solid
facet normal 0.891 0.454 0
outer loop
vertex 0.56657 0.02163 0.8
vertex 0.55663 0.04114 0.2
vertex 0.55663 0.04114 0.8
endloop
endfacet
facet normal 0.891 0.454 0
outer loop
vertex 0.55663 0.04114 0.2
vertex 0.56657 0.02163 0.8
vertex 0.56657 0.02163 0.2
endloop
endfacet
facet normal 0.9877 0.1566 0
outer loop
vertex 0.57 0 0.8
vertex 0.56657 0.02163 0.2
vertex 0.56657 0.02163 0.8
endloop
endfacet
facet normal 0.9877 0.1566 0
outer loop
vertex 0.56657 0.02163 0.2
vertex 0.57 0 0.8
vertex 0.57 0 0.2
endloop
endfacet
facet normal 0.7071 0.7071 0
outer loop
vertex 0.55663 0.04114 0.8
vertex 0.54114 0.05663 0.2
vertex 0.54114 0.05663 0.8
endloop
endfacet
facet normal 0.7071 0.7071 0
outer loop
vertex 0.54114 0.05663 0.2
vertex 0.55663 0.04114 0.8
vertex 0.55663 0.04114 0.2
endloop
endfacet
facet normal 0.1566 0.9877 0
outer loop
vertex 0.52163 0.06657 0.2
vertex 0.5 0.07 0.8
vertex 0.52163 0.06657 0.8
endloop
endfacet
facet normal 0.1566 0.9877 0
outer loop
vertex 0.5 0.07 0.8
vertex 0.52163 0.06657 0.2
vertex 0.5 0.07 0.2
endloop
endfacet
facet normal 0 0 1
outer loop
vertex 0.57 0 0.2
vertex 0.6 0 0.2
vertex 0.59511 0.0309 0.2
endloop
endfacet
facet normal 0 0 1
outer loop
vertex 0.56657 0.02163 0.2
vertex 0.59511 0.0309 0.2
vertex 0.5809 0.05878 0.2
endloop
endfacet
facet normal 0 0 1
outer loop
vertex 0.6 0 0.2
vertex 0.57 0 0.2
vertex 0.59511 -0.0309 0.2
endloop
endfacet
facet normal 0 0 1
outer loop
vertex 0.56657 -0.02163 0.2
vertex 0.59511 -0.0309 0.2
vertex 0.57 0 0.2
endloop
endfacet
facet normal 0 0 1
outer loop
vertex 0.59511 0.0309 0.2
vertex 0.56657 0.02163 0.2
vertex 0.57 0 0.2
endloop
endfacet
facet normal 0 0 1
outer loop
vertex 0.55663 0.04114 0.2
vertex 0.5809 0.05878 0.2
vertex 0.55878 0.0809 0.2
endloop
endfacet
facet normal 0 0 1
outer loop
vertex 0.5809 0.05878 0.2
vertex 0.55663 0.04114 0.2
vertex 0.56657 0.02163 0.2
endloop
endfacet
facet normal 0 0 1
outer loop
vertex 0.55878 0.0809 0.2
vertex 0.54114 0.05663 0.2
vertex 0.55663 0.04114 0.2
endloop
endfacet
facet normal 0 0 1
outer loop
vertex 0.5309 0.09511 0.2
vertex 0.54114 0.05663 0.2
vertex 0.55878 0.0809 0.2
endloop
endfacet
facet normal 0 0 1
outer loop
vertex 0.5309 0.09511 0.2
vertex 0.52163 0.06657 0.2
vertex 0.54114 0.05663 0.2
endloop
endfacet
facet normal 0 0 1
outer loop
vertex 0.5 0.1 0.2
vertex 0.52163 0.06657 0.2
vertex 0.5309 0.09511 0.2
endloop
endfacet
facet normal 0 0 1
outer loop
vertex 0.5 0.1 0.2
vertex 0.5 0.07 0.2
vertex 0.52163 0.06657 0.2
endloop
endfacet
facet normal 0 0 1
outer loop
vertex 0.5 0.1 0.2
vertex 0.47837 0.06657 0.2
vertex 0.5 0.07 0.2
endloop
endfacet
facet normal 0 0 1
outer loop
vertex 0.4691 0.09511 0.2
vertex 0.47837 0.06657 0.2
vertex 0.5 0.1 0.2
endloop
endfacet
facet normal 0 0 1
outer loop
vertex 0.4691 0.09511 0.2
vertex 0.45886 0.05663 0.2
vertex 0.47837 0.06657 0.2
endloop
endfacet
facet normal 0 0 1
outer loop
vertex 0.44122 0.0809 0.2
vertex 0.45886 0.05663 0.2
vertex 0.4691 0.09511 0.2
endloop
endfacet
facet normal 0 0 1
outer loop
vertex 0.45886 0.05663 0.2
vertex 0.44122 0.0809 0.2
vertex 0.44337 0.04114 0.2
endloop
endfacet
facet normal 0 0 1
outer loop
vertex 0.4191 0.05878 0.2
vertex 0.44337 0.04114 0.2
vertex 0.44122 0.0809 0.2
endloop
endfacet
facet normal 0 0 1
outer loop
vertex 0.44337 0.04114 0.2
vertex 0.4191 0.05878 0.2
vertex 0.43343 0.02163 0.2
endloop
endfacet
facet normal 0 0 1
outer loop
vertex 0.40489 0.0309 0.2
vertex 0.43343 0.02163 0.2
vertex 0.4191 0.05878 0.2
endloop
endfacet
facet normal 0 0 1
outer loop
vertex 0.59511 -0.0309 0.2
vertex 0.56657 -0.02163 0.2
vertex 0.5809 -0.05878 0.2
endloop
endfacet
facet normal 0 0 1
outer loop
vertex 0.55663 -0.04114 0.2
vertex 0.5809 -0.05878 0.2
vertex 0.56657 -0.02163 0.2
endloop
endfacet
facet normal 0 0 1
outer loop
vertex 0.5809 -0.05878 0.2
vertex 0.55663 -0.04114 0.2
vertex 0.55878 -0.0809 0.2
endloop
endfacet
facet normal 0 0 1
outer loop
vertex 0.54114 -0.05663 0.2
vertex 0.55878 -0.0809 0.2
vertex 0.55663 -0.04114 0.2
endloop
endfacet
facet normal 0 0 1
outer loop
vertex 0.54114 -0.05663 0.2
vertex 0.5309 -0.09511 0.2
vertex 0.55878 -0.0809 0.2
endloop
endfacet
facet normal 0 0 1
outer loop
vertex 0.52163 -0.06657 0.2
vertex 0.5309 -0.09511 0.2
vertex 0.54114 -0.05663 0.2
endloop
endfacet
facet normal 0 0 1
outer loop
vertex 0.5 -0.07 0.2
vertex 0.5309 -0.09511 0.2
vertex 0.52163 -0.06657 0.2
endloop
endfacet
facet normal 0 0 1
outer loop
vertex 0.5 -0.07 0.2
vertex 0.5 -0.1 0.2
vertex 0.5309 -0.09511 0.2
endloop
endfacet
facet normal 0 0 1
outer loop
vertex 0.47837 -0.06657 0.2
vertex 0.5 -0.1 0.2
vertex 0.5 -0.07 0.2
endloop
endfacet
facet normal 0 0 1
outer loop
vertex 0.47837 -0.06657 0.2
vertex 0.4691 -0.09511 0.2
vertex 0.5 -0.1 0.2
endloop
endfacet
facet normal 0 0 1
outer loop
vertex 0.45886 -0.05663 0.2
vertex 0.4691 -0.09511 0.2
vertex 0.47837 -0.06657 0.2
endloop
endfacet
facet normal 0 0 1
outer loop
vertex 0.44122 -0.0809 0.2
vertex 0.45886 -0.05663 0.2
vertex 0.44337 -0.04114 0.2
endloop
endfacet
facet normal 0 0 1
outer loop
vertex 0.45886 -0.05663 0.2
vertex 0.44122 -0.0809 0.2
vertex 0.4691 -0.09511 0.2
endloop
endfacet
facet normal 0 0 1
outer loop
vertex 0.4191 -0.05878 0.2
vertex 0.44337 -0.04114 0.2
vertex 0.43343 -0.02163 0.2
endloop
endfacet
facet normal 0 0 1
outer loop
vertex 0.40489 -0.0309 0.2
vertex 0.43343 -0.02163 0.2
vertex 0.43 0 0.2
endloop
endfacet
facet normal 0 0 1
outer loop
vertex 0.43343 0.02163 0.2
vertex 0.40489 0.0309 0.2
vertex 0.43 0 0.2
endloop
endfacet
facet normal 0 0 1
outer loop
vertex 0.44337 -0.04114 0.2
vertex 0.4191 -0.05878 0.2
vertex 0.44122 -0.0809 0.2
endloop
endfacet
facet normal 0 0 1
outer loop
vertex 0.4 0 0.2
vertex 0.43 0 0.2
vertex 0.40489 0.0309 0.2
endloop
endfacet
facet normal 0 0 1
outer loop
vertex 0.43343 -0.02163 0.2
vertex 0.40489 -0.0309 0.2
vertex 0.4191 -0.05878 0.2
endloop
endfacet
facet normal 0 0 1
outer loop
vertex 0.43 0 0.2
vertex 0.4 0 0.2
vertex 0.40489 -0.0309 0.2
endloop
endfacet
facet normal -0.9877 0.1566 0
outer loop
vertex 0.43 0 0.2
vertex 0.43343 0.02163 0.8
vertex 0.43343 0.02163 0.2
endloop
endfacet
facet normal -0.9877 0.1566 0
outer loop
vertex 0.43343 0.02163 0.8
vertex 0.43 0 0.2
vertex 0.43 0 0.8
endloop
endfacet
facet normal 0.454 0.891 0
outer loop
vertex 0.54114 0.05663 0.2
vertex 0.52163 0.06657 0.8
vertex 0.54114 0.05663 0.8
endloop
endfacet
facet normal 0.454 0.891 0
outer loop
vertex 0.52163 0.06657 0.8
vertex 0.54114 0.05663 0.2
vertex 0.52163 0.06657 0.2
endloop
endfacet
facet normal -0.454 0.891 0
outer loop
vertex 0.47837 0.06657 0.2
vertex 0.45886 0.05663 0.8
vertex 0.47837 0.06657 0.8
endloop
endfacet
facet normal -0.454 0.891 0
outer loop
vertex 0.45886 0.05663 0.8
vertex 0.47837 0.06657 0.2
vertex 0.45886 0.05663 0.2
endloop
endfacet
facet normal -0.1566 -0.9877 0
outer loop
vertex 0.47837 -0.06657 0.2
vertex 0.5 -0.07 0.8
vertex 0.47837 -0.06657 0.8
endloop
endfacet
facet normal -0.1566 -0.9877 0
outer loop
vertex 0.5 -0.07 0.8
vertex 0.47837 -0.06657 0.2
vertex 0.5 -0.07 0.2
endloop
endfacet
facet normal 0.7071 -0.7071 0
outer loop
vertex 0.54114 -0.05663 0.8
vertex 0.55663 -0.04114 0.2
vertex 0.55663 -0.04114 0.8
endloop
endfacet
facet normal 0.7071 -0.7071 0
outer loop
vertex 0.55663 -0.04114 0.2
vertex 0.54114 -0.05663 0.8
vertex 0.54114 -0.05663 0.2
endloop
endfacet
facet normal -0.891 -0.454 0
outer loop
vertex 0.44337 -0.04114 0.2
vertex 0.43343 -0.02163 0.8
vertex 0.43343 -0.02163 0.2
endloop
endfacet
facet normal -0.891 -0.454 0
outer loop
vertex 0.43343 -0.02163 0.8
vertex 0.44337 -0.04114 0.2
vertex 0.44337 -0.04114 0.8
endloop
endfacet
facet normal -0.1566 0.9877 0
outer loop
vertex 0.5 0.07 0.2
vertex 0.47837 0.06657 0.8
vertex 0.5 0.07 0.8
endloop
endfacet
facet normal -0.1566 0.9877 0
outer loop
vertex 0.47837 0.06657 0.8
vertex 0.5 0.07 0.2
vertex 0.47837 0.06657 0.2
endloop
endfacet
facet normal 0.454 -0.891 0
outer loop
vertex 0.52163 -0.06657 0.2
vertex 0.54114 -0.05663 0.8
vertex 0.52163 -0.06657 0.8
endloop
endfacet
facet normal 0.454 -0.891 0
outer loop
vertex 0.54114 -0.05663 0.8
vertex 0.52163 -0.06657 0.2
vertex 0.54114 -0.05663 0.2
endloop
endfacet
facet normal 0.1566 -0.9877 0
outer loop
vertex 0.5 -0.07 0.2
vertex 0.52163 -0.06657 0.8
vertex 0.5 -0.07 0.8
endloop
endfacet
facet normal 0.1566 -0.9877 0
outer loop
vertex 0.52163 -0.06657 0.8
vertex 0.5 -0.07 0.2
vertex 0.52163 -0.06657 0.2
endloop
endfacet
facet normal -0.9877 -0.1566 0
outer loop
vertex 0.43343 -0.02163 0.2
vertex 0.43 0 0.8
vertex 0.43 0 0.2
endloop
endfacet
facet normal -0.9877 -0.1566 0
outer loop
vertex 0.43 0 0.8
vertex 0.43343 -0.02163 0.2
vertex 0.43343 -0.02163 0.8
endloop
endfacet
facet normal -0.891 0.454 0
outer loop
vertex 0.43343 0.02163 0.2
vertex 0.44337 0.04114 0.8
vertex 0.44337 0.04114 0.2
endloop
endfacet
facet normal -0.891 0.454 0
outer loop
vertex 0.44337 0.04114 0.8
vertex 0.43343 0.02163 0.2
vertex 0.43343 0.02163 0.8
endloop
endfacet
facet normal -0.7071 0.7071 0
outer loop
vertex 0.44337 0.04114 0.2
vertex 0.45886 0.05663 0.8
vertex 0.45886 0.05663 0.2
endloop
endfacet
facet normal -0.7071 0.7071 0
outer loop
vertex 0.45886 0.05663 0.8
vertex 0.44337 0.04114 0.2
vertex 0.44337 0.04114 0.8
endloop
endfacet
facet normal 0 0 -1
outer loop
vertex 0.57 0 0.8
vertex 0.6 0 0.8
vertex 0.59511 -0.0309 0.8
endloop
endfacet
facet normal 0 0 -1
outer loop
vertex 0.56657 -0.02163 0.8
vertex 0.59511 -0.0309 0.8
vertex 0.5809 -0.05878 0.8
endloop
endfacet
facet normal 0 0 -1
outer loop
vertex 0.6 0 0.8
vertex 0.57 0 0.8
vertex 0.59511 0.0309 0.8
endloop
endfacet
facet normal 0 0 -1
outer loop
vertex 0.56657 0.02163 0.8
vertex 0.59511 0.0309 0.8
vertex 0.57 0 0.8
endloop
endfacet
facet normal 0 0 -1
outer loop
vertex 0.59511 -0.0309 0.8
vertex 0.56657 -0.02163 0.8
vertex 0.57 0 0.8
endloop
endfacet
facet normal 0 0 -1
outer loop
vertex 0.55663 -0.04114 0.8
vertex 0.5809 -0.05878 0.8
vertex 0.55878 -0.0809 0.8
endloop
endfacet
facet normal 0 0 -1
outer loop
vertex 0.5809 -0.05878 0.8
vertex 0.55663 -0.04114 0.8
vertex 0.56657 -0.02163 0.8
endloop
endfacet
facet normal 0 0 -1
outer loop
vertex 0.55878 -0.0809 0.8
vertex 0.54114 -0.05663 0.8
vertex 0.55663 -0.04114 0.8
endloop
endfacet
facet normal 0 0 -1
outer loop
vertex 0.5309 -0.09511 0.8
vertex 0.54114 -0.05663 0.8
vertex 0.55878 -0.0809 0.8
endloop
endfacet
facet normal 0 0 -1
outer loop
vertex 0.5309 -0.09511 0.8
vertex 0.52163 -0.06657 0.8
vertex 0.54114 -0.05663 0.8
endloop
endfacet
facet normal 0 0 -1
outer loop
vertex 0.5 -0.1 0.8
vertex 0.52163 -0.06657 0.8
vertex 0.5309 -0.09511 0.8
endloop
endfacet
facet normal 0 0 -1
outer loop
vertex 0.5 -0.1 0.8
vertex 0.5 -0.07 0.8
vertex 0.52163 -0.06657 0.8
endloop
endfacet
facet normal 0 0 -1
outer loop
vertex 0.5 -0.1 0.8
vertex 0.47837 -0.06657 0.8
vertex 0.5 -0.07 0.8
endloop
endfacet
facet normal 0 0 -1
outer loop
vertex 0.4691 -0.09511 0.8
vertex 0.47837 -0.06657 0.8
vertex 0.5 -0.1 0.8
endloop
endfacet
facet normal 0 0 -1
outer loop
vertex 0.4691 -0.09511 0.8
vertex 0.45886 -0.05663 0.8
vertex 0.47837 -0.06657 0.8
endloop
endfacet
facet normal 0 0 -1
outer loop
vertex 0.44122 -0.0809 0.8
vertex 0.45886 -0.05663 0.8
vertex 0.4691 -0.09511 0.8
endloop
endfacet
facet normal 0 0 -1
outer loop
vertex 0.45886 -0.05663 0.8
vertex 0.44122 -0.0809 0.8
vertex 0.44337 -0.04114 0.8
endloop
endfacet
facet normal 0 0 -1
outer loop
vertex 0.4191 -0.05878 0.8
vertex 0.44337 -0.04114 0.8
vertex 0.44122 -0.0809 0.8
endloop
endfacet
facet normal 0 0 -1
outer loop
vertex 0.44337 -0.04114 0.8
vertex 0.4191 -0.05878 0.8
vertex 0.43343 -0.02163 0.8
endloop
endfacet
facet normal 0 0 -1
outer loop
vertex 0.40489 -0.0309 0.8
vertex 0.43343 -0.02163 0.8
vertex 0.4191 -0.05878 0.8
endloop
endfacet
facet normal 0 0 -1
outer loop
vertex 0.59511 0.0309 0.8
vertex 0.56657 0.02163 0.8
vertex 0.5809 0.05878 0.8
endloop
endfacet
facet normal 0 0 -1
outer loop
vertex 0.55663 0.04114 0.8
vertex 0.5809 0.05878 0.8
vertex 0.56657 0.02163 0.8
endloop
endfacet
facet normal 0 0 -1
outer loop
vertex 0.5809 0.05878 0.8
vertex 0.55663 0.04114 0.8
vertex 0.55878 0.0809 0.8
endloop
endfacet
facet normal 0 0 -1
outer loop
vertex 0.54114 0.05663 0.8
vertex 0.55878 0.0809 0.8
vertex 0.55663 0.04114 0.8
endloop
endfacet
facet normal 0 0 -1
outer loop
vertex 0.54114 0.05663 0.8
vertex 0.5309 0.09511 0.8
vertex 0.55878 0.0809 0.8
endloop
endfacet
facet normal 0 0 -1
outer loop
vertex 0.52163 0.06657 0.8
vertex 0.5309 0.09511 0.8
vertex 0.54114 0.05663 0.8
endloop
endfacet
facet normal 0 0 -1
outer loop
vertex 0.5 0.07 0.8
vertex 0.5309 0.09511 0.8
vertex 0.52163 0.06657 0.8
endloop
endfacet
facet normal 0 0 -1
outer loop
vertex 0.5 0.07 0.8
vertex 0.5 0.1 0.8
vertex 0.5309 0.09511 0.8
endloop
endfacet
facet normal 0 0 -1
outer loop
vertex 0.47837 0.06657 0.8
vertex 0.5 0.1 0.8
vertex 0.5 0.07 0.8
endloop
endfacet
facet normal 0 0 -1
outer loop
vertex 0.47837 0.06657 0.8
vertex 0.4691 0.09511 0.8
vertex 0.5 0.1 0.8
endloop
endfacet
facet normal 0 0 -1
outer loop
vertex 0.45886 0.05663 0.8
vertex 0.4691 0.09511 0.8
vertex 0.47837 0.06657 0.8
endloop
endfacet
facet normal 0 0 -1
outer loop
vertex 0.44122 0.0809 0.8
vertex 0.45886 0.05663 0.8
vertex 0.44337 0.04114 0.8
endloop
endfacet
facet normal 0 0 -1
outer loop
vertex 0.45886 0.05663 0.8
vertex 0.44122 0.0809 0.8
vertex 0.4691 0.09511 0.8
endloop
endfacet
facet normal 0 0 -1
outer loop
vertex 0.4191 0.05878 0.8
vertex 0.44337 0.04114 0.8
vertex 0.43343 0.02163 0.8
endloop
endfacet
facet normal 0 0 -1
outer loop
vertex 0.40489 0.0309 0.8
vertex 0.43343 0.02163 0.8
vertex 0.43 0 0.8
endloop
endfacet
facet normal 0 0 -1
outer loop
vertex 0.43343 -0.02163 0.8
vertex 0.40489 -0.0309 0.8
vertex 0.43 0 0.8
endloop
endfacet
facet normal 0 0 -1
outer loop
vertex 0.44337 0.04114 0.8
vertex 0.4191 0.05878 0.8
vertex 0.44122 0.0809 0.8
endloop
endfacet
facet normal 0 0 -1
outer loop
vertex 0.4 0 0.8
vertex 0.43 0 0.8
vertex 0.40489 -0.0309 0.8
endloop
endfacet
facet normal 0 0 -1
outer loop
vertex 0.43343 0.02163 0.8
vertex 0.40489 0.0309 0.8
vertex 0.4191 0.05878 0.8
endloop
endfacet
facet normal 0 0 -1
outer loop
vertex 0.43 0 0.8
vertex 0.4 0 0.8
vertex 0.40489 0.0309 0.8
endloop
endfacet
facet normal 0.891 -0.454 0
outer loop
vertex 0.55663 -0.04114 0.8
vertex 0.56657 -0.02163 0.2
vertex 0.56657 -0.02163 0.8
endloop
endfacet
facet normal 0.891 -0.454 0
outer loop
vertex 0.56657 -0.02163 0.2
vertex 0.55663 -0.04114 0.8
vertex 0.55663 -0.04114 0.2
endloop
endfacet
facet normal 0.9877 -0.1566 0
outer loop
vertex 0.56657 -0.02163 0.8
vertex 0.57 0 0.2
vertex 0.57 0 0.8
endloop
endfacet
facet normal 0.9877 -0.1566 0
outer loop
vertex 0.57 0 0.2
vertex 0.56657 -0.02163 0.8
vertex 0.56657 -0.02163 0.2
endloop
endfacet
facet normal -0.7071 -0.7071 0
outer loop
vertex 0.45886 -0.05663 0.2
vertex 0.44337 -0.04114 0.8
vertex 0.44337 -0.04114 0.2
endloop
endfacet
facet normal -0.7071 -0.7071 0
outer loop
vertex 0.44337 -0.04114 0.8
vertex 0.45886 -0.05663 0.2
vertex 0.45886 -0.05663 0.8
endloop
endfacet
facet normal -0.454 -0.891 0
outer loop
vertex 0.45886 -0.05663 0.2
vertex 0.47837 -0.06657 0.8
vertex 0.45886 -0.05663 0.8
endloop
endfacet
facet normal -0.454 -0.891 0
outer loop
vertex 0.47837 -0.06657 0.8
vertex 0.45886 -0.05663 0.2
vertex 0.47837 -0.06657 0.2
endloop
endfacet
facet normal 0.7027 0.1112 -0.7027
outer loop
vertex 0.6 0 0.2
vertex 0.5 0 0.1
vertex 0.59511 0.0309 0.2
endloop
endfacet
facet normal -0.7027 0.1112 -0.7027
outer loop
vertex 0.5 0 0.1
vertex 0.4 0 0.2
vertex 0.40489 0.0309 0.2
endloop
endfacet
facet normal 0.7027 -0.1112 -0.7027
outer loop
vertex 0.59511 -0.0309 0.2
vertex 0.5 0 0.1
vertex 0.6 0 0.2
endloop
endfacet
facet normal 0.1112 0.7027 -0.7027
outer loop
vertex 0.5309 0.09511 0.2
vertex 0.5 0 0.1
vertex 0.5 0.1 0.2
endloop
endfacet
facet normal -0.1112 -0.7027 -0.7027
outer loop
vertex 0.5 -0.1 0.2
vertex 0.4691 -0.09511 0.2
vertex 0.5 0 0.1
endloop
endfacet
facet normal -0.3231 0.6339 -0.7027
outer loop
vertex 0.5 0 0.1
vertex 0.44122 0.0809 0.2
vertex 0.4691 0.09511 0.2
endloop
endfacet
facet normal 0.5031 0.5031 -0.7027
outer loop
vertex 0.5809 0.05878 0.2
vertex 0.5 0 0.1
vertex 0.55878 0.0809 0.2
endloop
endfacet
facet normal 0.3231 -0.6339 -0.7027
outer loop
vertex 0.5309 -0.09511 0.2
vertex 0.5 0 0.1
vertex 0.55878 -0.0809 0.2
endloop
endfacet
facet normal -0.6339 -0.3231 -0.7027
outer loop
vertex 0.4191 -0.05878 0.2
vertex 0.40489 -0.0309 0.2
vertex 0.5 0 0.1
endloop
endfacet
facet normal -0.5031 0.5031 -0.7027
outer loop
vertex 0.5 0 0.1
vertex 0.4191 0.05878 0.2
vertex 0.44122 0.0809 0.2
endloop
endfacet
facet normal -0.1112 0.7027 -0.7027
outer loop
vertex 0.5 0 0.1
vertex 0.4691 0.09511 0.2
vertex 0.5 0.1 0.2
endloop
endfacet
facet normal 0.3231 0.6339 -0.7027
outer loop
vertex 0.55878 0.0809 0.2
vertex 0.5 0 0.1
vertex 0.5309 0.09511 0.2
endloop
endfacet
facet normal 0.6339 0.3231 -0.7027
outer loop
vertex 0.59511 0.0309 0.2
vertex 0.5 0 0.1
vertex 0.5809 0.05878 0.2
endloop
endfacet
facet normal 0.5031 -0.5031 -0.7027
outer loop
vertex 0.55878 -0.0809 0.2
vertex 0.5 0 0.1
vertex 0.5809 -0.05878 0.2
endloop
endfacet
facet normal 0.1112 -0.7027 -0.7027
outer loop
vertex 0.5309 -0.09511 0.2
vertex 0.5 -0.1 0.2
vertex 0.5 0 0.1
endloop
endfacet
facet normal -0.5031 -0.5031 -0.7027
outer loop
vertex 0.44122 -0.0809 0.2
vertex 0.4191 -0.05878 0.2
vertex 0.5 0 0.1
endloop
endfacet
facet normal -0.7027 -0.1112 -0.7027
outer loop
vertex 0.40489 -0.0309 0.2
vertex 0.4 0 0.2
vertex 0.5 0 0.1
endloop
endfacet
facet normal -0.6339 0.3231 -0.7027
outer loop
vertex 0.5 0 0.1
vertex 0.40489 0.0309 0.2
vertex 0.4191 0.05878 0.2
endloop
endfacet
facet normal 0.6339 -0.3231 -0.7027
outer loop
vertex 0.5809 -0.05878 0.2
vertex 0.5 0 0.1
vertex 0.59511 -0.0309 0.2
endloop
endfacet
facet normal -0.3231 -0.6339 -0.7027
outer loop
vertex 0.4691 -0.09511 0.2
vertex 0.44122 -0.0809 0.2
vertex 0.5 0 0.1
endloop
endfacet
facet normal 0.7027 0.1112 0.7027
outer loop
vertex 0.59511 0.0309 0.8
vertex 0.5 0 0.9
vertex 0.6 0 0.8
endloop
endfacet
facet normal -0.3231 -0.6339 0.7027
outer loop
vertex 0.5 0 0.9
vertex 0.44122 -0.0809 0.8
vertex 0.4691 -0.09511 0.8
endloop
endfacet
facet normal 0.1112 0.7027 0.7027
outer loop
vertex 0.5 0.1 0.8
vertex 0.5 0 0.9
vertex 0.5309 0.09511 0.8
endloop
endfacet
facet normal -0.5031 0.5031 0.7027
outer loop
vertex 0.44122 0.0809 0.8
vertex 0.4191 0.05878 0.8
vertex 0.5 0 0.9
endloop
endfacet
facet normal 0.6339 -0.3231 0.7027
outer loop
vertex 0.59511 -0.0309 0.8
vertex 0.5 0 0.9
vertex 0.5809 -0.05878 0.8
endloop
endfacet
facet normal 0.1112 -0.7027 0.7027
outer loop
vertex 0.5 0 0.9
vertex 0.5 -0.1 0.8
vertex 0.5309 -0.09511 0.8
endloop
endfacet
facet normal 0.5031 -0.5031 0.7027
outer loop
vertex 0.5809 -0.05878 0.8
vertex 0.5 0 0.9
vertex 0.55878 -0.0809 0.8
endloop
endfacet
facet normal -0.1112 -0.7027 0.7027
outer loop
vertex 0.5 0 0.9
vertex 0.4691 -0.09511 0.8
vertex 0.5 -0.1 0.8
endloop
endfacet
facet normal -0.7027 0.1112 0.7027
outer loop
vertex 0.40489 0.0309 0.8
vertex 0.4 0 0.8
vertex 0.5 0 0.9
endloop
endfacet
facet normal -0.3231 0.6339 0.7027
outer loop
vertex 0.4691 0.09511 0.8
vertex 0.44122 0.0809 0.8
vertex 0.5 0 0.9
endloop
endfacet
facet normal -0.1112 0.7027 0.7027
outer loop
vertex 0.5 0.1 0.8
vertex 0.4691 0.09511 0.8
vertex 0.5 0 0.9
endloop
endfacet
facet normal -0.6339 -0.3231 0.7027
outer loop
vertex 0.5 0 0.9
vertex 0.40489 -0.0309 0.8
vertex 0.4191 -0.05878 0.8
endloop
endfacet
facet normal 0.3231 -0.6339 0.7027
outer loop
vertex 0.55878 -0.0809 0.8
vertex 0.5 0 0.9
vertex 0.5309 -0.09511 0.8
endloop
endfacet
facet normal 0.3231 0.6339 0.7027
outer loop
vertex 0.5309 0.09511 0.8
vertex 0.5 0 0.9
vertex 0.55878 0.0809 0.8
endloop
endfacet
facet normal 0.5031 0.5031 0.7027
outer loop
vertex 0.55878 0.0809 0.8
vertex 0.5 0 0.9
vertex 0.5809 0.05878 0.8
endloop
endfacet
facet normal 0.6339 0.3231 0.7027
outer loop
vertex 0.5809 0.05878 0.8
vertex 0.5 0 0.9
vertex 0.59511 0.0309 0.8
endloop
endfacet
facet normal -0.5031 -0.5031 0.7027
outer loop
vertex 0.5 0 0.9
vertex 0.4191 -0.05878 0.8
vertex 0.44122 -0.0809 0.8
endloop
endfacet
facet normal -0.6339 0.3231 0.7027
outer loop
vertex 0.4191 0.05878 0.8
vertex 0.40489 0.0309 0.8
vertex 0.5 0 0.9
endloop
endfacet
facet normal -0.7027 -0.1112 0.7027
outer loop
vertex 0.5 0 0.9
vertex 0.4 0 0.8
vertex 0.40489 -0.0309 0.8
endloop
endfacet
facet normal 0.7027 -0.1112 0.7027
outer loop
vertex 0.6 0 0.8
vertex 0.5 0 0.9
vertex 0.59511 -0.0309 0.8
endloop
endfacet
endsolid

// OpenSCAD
color([0.3, 0.3, 0.5])
translate([0.5, 0, 0.0]) {
    translate([0,0,0.2])
    cylinder(h = 0.6, r = 0.07, $fn = 20);
    translate([0,0,0.1])
    cylinder(h = 0.1, r1 = 0.0, r2 = 0.1, $fn = 20);
    translate([0,0,0.8])
    cylinder(h = 0.1, r1 = 0.1, r2 = 0.0, $fn = 20);
}
